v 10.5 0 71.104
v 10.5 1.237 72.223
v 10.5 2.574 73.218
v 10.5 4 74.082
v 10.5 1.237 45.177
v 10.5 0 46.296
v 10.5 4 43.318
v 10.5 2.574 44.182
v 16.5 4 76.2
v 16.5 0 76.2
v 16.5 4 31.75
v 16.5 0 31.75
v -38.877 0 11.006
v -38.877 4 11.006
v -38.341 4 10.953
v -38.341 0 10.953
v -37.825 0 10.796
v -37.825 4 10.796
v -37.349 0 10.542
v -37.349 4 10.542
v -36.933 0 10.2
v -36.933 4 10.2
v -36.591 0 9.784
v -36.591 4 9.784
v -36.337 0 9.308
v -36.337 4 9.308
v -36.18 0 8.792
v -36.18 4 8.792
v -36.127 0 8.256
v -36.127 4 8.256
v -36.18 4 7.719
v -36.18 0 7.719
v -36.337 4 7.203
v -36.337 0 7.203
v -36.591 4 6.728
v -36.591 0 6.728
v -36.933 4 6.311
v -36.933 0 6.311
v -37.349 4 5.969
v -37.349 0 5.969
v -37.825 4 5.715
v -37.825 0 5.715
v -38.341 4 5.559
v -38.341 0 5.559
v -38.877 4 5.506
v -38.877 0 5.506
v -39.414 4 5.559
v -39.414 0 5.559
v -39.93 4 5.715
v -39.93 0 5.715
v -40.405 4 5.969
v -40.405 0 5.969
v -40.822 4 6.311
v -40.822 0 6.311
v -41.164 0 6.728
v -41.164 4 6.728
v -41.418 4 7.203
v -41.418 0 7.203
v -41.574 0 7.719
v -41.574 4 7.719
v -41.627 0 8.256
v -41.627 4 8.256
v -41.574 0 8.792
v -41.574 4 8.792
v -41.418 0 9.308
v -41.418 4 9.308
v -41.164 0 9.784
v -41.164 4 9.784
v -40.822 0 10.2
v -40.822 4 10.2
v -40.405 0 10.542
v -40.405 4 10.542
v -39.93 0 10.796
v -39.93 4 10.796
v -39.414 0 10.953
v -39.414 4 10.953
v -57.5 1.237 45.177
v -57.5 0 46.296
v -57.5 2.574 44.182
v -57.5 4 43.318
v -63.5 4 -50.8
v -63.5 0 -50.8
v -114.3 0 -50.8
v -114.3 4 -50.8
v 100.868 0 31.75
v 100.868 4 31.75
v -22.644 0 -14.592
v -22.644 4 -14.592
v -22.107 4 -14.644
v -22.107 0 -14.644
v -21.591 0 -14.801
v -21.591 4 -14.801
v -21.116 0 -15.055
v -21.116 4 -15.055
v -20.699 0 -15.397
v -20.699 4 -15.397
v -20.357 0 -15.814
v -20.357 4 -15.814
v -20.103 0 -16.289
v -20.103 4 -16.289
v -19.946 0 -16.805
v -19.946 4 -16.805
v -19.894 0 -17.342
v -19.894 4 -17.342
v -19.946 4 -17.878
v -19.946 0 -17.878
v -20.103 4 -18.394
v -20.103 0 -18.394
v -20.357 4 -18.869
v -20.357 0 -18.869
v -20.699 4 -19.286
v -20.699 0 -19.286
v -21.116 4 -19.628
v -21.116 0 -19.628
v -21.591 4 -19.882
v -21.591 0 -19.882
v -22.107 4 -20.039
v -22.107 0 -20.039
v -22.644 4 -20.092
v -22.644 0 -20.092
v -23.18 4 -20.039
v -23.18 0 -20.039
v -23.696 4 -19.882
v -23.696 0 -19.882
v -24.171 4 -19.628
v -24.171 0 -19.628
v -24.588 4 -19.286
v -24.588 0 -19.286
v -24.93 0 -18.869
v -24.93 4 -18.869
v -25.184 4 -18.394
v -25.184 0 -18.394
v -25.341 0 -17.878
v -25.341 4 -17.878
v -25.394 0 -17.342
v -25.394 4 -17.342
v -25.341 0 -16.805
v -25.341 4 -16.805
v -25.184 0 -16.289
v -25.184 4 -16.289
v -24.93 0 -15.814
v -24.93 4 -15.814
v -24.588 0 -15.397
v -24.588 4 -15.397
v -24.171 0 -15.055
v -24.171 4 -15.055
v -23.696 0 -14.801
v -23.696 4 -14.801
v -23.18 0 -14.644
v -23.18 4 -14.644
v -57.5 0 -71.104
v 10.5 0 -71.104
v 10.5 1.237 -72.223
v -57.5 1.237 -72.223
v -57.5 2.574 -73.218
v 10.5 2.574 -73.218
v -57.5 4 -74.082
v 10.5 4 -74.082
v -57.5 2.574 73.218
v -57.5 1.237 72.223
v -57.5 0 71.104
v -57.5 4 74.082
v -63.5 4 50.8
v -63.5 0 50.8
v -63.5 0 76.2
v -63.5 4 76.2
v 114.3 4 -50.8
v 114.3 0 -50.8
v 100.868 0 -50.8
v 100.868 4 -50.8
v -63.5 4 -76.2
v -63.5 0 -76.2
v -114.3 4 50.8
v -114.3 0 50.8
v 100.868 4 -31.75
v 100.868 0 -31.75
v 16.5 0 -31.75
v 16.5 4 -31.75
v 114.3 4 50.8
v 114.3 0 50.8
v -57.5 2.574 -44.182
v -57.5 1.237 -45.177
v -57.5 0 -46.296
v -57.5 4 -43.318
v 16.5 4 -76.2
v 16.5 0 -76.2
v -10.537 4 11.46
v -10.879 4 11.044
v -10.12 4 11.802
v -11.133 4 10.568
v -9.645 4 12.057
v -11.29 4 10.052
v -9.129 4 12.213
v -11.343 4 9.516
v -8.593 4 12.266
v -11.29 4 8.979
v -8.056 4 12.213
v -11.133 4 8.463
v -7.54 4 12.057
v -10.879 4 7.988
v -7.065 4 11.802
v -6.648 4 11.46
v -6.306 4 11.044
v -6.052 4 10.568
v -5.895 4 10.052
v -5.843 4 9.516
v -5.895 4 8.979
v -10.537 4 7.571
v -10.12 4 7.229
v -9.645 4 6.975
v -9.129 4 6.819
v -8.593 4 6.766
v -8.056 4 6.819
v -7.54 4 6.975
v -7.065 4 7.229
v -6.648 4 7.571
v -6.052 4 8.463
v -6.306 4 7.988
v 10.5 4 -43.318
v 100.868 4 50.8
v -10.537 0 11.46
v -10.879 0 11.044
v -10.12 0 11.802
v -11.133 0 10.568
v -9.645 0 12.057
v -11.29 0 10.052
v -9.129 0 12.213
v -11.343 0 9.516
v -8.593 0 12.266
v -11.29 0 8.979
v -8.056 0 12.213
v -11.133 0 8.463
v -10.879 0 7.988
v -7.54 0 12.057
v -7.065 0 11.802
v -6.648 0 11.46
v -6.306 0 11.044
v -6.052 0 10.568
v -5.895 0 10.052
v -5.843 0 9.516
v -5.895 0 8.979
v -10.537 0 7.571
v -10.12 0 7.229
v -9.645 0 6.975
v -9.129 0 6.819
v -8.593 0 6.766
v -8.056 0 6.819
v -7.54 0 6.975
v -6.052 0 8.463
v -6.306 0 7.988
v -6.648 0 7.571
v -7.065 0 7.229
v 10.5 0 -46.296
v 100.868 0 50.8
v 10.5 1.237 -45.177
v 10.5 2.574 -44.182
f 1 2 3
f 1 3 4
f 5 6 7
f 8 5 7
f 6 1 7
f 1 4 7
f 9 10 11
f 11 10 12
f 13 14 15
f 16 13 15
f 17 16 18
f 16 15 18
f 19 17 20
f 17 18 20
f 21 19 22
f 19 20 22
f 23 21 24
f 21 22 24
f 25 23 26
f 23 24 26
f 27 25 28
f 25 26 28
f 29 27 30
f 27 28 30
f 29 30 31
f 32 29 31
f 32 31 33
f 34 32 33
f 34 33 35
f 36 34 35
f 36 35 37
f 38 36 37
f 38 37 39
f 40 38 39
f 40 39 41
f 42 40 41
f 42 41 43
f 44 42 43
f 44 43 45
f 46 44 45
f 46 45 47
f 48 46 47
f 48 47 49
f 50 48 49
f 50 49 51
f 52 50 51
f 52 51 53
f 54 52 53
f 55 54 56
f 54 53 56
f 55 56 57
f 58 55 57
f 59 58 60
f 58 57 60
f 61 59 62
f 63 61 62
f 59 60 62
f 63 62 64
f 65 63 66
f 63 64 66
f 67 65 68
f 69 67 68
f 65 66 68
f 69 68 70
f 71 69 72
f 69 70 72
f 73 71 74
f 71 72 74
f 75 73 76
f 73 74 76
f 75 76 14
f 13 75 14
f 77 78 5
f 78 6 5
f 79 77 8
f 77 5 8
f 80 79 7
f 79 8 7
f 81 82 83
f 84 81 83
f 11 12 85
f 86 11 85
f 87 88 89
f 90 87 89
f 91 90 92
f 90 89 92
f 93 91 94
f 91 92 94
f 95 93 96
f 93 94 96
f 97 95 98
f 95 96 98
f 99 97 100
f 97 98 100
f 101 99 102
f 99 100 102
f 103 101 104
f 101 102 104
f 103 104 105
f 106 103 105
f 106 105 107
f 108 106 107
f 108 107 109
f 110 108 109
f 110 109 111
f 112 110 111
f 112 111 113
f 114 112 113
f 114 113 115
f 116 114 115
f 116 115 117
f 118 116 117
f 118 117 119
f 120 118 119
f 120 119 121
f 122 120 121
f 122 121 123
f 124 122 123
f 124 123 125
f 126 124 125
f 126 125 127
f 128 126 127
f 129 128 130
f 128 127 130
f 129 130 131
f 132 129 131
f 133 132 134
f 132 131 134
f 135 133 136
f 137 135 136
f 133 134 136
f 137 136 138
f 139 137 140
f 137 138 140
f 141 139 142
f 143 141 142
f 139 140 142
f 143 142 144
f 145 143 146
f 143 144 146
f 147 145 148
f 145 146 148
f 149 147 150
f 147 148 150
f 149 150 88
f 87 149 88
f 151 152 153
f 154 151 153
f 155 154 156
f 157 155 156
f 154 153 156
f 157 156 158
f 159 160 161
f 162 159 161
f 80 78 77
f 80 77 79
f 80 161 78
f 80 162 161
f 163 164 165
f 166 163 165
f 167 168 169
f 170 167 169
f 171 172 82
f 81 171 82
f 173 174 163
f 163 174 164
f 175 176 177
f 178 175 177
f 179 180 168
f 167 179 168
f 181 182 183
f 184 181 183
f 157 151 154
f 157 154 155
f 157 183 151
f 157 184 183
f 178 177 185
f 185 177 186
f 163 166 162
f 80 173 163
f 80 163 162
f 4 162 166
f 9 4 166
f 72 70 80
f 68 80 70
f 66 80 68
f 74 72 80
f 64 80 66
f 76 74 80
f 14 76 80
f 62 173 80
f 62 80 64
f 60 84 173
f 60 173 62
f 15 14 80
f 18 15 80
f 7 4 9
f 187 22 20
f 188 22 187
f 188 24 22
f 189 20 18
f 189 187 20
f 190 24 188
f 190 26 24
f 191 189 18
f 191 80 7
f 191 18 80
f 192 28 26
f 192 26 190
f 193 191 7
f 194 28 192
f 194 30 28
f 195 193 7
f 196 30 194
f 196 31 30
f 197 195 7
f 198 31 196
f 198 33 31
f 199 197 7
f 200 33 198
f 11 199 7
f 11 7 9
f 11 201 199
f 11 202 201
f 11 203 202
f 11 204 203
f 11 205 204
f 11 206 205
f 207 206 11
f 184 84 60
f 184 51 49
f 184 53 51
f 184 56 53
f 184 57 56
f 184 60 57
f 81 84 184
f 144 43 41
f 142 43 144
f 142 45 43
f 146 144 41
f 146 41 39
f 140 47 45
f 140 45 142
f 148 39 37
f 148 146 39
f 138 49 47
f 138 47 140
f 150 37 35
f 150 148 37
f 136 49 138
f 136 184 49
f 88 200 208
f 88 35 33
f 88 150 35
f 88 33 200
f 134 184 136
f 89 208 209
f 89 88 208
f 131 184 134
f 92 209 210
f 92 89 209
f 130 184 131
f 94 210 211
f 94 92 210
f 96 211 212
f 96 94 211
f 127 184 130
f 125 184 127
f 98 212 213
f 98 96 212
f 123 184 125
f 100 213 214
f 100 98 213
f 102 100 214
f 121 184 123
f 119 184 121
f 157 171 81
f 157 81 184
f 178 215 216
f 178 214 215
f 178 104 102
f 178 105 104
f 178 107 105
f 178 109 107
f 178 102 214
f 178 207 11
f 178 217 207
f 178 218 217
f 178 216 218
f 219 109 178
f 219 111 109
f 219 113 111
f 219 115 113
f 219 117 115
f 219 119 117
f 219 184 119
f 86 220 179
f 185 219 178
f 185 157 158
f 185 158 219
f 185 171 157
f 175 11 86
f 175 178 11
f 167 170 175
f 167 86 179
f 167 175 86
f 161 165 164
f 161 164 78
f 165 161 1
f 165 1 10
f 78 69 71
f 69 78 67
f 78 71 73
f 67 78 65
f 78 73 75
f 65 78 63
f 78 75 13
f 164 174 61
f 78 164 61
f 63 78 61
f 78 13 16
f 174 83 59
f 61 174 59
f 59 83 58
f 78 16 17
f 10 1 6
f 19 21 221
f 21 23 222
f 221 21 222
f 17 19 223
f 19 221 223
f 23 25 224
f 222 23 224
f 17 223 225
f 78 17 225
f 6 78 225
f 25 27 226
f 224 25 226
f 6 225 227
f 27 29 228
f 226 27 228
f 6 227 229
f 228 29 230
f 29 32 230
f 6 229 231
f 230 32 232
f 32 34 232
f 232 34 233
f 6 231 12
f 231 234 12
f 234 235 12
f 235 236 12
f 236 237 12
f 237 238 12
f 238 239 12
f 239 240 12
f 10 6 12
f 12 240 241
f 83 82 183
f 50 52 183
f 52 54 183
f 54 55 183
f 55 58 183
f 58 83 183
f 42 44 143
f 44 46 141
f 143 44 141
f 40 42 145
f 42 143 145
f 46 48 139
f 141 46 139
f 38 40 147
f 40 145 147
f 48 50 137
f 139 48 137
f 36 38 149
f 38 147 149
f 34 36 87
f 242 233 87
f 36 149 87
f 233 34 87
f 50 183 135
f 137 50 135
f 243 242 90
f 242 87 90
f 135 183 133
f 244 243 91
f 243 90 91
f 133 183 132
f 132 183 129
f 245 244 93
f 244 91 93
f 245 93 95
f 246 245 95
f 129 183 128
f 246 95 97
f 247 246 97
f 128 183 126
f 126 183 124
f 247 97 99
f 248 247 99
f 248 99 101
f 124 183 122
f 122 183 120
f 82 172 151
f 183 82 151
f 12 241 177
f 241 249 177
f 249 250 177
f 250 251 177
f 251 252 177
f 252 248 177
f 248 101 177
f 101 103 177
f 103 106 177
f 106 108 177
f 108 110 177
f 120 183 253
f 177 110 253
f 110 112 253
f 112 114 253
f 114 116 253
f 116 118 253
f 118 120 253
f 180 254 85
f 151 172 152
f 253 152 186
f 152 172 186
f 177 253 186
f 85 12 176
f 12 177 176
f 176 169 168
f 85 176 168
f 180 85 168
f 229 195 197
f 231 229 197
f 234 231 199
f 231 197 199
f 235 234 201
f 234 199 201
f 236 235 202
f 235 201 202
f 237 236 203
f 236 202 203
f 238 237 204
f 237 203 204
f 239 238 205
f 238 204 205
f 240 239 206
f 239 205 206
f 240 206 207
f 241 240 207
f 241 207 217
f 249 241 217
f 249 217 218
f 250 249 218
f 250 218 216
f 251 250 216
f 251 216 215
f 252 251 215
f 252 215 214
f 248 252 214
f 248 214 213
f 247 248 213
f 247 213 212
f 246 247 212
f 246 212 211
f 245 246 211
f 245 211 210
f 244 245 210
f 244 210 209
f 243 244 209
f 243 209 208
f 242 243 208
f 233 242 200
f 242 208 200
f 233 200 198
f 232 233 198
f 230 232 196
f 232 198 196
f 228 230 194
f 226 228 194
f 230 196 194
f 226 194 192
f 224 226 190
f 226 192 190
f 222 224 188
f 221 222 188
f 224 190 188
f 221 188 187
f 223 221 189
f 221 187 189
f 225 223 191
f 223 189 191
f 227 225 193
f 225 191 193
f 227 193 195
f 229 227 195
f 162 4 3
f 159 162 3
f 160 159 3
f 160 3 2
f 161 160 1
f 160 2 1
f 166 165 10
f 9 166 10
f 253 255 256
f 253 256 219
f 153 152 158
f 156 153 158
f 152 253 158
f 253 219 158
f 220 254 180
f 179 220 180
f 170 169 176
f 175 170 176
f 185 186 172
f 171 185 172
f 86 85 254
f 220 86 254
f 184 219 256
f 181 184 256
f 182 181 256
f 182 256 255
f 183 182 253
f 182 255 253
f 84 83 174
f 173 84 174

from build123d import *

# Parameters (mm, degrees)
BOSS_EXTRUDE1_DEPTH    = 4
SPLIT2_SURFACE_1_BACK  = 275.772
SPLIT2_SURFACE_1_DEPTH = 551.544
SPLIT2_SURFACE_2_BACK  = 275.772
SPLIT2_SURFACE_2_DEPTH = 551.544
BOSS_EXTRUDE4_START    = -76.2
BOSS_EXTRUDE4_DEPTH    = 152.4
SKETCH8_R              = 17.5
CUT_EXTRUDE4_DEPTH     = 68
SKETCH11_R             = 2.75
CUT_EXTRUDE6_DEPTH     = 138.734999183
SKETCH12_W             = 167.624585895
SKETCH12_H             = 26.062825832
CUT_EXTRUDE7_DEPTH     = 147.892749991


with BuildPart() as part:
    # Sketch1 → Boss-Extrude1 (new body)
    with BuildSketch(Plane(origin=(0, 0, 0), x_dir=(1, 0, 0), z_dir=(0, 1, 0))):
        Polygon((-114.3, 50.8), (-114.3, -50.8), (-63.5, -50.8), (-63.5, -76.2), (16.5, -76.2), (16.5, -31.75), (100.867964722, -31.75), (100.867964722, -50.8), (114.3, -50.8), (114.3, 50.8), (100.867964722, 50.8), (100.867964722, 31.75), (16.5, 31.75), (16.5, 76.2), (-63.5, 76.2), (-63.5, 50.8), align=None)
    extrude(amount=BOSS_EXTRUDE1_DEPTH)


with BuildPart() as body_2:
    # Split2: the piece behind the surface
    add(part.part)
    # Split2 surface: a surface, the sketch's curves swept straight by 551.544 mm
    with BuildLine(Plane.XY.offset(76.2).offset(-SPLIT2_SURFACE_1_BACK), mode=Mode.PRIVATE) as split2_surface_1_path:
        Line((16.5, 0), (-23.5, 0))
        Line((-23.5, 0), (-23.5, 2))
        Line((-23.5, 2), (-63.5, 2))
        Line((-63.5, 2), (-63.5, 4))
    split2_surface_1 = Shell.extrude(split2_surface_1_path.wire(), (0 * SPLIT2_SURFACE_1_DEPTH, 0 * SPLIT2_SURFACE_1_DEPTH, 1 * SPLIT2_SURFACE_1_DEPTH))
    split(bisect_by=split2_surface_1, keep=Keep.BOTTOM)


with BuildPart() as part_1:
    add(part.part)

    # Split2: split by a surface, the side it looks to stays
    # Split2 surface: a surface, the sketch's curves swept straight by 551.544 mm
    with BuildLine(Plane.XY.offset(76.2).offset(-SPLIT2_SURFACE_2_BACK), mode=Mode.PRIVATE) as split2_surface_2_path:
        Line((16.5, 0), (-23.5, 0))
        Line((-23.5, 0), (-23.5, 2))
        Line((-23.5, 2), (-63.5, 2))
        Line((-63.5, 2), (-63.5, 4))
    split2_surface_2 = Shell.extrude(split2_surface_2_path.wire(), (0 * SPLIT2_SURFACE_2_DEPTH, 0 * SPLIT2_SURFACE_2_DEPTH, 1 * SPLIT2_SURFACE_2_DEPTH))
    split(bisect_by=split2_surface_2, keep=Keep.TOP)

    add(body_2.part)  # Boss-Extrude4 merges body 2
    # Boss-Extrude4: read off the stored shape, not the designer's step
    # Boss-Extrude4 outline → Boss-Extrude4 (add)
    with BuildSketch(Plane.XY.offset(BOSS_EXTRUDE4_START)):
        Polygon((-57.5, 4), (-63.5, 4), (-63.5, 0), (16.5, 0), (16.5, 4), (10.5, 4), (10.5, 14), (-57.5, 14), align=None)
    extrude(amount=BOSS_EXTRUDE4_DEPTH)

    # Sketch8 → Cut-Extrude4 (cut)
    with BuildSketch(Plane(origin=(10.5, 0, 0), x_dir=(0, 0, -1), z_dir=(1, 0, 0))):
        with Locations((-58.7, 12.344512168)):
            Circle(SKETCH8_R)
        with Locations((58.7, 12.344512168)):
            Circle(SKETCH8_R)
    extrude(amount=-CUT_EXTRUDE4_DEPTH, mode=Mode.SUBTRACT)


with BuildPart() as cut_extrude4_piece_1:
    # of the separate pieces the step leaves, piece 1, a body of its own (cut_extrude4_pieces)
    add(part_1.part.solids().sort_by_distance((16.5, 0, -31.75))[0])

    # Sketch11 → Cut-Extrude6 (cut, through all)
    with BuildSketch(Plane(origin=(0, 4, 0), x_dir=(1, 0, 0), z_dir=(0, 1, 0))):
        with Locations(Location((-22.643612575, 17.341502836, 0), (0, 0, 270))):
            Circle(SKETCH11_R)
        with Locations(Location((-38.877222753, -8.255760701, 0), (0, 0, 270))):
            Circle(SKETCH11_R)
        with Locations(Location((-8.592537174, -9.515847743, 0), (0, 0, 270))):
            Circle(SKETCH11_R)
    extrude(amount=-CUT_EXTRUDE6_DEPTH, mode=Mode.SUBTRACT)


with BuildPart() as cut_extrude4_piece_2:
    # of the separate pieces the step leaves, piece 2, a body of its own (cut_extrude4_pieces)
    add(part_1.part.solids().sort_by_distance((10.5, 14, 76.2))[0])


with BuildPart() as cut_extrude4_piece_3:
    # of the separate pieces the step leaves, piece 3, a body of its own (cut_extrude4_pieces)
    add(part_1.part.solids().sort_by_distance((-57.5, 14, -76.2))[0])


with BuildPart() as cut_extrude7_tool:
    # Sketch12 → Cut-Extrude7 (new, through all)
    with BuildSketch(Plane(origin=(10.5, 0, 0), x_dir=(0, 0, -1), z_dir=(1, 0, 0))):
        with Locations((1.392837232, 17.031412916)):
            Rectangle(SKETCH12_W, SKETCH12_H)
    extrude(amount=-CUT_EXTRUDE7_DEPTH)


with BuildPart() as cut_extrude4_piece_1_1:
    add(cut_extrude4_piece_1.part)

    # Cut-Extrude7: cut by cut_extrude7_tool
    add(cut_extrude7_tool.part, mode=Mode.SUBTRACT)


with BuildPart() as cut_extrude4_piece_2_1:
    add(cut_extrude4_piece_2.part)

    # Cut-Extrude7: cut by cut_extrude7_tool
    add(cut_extrude7_tool.part, mode=Mode.SUBTRACT)


with BuildPart() as cut_extrude4_piece_3_1:
    add(cut_extrude4_piece_3.part)

    # Cut-Extrude7: cut by cut_extrude7_tool
    add(cut_extrude7_tool.part, mode=Mode.SUBTRACT)


solid = cut_extrude4_piece_1_1.part
